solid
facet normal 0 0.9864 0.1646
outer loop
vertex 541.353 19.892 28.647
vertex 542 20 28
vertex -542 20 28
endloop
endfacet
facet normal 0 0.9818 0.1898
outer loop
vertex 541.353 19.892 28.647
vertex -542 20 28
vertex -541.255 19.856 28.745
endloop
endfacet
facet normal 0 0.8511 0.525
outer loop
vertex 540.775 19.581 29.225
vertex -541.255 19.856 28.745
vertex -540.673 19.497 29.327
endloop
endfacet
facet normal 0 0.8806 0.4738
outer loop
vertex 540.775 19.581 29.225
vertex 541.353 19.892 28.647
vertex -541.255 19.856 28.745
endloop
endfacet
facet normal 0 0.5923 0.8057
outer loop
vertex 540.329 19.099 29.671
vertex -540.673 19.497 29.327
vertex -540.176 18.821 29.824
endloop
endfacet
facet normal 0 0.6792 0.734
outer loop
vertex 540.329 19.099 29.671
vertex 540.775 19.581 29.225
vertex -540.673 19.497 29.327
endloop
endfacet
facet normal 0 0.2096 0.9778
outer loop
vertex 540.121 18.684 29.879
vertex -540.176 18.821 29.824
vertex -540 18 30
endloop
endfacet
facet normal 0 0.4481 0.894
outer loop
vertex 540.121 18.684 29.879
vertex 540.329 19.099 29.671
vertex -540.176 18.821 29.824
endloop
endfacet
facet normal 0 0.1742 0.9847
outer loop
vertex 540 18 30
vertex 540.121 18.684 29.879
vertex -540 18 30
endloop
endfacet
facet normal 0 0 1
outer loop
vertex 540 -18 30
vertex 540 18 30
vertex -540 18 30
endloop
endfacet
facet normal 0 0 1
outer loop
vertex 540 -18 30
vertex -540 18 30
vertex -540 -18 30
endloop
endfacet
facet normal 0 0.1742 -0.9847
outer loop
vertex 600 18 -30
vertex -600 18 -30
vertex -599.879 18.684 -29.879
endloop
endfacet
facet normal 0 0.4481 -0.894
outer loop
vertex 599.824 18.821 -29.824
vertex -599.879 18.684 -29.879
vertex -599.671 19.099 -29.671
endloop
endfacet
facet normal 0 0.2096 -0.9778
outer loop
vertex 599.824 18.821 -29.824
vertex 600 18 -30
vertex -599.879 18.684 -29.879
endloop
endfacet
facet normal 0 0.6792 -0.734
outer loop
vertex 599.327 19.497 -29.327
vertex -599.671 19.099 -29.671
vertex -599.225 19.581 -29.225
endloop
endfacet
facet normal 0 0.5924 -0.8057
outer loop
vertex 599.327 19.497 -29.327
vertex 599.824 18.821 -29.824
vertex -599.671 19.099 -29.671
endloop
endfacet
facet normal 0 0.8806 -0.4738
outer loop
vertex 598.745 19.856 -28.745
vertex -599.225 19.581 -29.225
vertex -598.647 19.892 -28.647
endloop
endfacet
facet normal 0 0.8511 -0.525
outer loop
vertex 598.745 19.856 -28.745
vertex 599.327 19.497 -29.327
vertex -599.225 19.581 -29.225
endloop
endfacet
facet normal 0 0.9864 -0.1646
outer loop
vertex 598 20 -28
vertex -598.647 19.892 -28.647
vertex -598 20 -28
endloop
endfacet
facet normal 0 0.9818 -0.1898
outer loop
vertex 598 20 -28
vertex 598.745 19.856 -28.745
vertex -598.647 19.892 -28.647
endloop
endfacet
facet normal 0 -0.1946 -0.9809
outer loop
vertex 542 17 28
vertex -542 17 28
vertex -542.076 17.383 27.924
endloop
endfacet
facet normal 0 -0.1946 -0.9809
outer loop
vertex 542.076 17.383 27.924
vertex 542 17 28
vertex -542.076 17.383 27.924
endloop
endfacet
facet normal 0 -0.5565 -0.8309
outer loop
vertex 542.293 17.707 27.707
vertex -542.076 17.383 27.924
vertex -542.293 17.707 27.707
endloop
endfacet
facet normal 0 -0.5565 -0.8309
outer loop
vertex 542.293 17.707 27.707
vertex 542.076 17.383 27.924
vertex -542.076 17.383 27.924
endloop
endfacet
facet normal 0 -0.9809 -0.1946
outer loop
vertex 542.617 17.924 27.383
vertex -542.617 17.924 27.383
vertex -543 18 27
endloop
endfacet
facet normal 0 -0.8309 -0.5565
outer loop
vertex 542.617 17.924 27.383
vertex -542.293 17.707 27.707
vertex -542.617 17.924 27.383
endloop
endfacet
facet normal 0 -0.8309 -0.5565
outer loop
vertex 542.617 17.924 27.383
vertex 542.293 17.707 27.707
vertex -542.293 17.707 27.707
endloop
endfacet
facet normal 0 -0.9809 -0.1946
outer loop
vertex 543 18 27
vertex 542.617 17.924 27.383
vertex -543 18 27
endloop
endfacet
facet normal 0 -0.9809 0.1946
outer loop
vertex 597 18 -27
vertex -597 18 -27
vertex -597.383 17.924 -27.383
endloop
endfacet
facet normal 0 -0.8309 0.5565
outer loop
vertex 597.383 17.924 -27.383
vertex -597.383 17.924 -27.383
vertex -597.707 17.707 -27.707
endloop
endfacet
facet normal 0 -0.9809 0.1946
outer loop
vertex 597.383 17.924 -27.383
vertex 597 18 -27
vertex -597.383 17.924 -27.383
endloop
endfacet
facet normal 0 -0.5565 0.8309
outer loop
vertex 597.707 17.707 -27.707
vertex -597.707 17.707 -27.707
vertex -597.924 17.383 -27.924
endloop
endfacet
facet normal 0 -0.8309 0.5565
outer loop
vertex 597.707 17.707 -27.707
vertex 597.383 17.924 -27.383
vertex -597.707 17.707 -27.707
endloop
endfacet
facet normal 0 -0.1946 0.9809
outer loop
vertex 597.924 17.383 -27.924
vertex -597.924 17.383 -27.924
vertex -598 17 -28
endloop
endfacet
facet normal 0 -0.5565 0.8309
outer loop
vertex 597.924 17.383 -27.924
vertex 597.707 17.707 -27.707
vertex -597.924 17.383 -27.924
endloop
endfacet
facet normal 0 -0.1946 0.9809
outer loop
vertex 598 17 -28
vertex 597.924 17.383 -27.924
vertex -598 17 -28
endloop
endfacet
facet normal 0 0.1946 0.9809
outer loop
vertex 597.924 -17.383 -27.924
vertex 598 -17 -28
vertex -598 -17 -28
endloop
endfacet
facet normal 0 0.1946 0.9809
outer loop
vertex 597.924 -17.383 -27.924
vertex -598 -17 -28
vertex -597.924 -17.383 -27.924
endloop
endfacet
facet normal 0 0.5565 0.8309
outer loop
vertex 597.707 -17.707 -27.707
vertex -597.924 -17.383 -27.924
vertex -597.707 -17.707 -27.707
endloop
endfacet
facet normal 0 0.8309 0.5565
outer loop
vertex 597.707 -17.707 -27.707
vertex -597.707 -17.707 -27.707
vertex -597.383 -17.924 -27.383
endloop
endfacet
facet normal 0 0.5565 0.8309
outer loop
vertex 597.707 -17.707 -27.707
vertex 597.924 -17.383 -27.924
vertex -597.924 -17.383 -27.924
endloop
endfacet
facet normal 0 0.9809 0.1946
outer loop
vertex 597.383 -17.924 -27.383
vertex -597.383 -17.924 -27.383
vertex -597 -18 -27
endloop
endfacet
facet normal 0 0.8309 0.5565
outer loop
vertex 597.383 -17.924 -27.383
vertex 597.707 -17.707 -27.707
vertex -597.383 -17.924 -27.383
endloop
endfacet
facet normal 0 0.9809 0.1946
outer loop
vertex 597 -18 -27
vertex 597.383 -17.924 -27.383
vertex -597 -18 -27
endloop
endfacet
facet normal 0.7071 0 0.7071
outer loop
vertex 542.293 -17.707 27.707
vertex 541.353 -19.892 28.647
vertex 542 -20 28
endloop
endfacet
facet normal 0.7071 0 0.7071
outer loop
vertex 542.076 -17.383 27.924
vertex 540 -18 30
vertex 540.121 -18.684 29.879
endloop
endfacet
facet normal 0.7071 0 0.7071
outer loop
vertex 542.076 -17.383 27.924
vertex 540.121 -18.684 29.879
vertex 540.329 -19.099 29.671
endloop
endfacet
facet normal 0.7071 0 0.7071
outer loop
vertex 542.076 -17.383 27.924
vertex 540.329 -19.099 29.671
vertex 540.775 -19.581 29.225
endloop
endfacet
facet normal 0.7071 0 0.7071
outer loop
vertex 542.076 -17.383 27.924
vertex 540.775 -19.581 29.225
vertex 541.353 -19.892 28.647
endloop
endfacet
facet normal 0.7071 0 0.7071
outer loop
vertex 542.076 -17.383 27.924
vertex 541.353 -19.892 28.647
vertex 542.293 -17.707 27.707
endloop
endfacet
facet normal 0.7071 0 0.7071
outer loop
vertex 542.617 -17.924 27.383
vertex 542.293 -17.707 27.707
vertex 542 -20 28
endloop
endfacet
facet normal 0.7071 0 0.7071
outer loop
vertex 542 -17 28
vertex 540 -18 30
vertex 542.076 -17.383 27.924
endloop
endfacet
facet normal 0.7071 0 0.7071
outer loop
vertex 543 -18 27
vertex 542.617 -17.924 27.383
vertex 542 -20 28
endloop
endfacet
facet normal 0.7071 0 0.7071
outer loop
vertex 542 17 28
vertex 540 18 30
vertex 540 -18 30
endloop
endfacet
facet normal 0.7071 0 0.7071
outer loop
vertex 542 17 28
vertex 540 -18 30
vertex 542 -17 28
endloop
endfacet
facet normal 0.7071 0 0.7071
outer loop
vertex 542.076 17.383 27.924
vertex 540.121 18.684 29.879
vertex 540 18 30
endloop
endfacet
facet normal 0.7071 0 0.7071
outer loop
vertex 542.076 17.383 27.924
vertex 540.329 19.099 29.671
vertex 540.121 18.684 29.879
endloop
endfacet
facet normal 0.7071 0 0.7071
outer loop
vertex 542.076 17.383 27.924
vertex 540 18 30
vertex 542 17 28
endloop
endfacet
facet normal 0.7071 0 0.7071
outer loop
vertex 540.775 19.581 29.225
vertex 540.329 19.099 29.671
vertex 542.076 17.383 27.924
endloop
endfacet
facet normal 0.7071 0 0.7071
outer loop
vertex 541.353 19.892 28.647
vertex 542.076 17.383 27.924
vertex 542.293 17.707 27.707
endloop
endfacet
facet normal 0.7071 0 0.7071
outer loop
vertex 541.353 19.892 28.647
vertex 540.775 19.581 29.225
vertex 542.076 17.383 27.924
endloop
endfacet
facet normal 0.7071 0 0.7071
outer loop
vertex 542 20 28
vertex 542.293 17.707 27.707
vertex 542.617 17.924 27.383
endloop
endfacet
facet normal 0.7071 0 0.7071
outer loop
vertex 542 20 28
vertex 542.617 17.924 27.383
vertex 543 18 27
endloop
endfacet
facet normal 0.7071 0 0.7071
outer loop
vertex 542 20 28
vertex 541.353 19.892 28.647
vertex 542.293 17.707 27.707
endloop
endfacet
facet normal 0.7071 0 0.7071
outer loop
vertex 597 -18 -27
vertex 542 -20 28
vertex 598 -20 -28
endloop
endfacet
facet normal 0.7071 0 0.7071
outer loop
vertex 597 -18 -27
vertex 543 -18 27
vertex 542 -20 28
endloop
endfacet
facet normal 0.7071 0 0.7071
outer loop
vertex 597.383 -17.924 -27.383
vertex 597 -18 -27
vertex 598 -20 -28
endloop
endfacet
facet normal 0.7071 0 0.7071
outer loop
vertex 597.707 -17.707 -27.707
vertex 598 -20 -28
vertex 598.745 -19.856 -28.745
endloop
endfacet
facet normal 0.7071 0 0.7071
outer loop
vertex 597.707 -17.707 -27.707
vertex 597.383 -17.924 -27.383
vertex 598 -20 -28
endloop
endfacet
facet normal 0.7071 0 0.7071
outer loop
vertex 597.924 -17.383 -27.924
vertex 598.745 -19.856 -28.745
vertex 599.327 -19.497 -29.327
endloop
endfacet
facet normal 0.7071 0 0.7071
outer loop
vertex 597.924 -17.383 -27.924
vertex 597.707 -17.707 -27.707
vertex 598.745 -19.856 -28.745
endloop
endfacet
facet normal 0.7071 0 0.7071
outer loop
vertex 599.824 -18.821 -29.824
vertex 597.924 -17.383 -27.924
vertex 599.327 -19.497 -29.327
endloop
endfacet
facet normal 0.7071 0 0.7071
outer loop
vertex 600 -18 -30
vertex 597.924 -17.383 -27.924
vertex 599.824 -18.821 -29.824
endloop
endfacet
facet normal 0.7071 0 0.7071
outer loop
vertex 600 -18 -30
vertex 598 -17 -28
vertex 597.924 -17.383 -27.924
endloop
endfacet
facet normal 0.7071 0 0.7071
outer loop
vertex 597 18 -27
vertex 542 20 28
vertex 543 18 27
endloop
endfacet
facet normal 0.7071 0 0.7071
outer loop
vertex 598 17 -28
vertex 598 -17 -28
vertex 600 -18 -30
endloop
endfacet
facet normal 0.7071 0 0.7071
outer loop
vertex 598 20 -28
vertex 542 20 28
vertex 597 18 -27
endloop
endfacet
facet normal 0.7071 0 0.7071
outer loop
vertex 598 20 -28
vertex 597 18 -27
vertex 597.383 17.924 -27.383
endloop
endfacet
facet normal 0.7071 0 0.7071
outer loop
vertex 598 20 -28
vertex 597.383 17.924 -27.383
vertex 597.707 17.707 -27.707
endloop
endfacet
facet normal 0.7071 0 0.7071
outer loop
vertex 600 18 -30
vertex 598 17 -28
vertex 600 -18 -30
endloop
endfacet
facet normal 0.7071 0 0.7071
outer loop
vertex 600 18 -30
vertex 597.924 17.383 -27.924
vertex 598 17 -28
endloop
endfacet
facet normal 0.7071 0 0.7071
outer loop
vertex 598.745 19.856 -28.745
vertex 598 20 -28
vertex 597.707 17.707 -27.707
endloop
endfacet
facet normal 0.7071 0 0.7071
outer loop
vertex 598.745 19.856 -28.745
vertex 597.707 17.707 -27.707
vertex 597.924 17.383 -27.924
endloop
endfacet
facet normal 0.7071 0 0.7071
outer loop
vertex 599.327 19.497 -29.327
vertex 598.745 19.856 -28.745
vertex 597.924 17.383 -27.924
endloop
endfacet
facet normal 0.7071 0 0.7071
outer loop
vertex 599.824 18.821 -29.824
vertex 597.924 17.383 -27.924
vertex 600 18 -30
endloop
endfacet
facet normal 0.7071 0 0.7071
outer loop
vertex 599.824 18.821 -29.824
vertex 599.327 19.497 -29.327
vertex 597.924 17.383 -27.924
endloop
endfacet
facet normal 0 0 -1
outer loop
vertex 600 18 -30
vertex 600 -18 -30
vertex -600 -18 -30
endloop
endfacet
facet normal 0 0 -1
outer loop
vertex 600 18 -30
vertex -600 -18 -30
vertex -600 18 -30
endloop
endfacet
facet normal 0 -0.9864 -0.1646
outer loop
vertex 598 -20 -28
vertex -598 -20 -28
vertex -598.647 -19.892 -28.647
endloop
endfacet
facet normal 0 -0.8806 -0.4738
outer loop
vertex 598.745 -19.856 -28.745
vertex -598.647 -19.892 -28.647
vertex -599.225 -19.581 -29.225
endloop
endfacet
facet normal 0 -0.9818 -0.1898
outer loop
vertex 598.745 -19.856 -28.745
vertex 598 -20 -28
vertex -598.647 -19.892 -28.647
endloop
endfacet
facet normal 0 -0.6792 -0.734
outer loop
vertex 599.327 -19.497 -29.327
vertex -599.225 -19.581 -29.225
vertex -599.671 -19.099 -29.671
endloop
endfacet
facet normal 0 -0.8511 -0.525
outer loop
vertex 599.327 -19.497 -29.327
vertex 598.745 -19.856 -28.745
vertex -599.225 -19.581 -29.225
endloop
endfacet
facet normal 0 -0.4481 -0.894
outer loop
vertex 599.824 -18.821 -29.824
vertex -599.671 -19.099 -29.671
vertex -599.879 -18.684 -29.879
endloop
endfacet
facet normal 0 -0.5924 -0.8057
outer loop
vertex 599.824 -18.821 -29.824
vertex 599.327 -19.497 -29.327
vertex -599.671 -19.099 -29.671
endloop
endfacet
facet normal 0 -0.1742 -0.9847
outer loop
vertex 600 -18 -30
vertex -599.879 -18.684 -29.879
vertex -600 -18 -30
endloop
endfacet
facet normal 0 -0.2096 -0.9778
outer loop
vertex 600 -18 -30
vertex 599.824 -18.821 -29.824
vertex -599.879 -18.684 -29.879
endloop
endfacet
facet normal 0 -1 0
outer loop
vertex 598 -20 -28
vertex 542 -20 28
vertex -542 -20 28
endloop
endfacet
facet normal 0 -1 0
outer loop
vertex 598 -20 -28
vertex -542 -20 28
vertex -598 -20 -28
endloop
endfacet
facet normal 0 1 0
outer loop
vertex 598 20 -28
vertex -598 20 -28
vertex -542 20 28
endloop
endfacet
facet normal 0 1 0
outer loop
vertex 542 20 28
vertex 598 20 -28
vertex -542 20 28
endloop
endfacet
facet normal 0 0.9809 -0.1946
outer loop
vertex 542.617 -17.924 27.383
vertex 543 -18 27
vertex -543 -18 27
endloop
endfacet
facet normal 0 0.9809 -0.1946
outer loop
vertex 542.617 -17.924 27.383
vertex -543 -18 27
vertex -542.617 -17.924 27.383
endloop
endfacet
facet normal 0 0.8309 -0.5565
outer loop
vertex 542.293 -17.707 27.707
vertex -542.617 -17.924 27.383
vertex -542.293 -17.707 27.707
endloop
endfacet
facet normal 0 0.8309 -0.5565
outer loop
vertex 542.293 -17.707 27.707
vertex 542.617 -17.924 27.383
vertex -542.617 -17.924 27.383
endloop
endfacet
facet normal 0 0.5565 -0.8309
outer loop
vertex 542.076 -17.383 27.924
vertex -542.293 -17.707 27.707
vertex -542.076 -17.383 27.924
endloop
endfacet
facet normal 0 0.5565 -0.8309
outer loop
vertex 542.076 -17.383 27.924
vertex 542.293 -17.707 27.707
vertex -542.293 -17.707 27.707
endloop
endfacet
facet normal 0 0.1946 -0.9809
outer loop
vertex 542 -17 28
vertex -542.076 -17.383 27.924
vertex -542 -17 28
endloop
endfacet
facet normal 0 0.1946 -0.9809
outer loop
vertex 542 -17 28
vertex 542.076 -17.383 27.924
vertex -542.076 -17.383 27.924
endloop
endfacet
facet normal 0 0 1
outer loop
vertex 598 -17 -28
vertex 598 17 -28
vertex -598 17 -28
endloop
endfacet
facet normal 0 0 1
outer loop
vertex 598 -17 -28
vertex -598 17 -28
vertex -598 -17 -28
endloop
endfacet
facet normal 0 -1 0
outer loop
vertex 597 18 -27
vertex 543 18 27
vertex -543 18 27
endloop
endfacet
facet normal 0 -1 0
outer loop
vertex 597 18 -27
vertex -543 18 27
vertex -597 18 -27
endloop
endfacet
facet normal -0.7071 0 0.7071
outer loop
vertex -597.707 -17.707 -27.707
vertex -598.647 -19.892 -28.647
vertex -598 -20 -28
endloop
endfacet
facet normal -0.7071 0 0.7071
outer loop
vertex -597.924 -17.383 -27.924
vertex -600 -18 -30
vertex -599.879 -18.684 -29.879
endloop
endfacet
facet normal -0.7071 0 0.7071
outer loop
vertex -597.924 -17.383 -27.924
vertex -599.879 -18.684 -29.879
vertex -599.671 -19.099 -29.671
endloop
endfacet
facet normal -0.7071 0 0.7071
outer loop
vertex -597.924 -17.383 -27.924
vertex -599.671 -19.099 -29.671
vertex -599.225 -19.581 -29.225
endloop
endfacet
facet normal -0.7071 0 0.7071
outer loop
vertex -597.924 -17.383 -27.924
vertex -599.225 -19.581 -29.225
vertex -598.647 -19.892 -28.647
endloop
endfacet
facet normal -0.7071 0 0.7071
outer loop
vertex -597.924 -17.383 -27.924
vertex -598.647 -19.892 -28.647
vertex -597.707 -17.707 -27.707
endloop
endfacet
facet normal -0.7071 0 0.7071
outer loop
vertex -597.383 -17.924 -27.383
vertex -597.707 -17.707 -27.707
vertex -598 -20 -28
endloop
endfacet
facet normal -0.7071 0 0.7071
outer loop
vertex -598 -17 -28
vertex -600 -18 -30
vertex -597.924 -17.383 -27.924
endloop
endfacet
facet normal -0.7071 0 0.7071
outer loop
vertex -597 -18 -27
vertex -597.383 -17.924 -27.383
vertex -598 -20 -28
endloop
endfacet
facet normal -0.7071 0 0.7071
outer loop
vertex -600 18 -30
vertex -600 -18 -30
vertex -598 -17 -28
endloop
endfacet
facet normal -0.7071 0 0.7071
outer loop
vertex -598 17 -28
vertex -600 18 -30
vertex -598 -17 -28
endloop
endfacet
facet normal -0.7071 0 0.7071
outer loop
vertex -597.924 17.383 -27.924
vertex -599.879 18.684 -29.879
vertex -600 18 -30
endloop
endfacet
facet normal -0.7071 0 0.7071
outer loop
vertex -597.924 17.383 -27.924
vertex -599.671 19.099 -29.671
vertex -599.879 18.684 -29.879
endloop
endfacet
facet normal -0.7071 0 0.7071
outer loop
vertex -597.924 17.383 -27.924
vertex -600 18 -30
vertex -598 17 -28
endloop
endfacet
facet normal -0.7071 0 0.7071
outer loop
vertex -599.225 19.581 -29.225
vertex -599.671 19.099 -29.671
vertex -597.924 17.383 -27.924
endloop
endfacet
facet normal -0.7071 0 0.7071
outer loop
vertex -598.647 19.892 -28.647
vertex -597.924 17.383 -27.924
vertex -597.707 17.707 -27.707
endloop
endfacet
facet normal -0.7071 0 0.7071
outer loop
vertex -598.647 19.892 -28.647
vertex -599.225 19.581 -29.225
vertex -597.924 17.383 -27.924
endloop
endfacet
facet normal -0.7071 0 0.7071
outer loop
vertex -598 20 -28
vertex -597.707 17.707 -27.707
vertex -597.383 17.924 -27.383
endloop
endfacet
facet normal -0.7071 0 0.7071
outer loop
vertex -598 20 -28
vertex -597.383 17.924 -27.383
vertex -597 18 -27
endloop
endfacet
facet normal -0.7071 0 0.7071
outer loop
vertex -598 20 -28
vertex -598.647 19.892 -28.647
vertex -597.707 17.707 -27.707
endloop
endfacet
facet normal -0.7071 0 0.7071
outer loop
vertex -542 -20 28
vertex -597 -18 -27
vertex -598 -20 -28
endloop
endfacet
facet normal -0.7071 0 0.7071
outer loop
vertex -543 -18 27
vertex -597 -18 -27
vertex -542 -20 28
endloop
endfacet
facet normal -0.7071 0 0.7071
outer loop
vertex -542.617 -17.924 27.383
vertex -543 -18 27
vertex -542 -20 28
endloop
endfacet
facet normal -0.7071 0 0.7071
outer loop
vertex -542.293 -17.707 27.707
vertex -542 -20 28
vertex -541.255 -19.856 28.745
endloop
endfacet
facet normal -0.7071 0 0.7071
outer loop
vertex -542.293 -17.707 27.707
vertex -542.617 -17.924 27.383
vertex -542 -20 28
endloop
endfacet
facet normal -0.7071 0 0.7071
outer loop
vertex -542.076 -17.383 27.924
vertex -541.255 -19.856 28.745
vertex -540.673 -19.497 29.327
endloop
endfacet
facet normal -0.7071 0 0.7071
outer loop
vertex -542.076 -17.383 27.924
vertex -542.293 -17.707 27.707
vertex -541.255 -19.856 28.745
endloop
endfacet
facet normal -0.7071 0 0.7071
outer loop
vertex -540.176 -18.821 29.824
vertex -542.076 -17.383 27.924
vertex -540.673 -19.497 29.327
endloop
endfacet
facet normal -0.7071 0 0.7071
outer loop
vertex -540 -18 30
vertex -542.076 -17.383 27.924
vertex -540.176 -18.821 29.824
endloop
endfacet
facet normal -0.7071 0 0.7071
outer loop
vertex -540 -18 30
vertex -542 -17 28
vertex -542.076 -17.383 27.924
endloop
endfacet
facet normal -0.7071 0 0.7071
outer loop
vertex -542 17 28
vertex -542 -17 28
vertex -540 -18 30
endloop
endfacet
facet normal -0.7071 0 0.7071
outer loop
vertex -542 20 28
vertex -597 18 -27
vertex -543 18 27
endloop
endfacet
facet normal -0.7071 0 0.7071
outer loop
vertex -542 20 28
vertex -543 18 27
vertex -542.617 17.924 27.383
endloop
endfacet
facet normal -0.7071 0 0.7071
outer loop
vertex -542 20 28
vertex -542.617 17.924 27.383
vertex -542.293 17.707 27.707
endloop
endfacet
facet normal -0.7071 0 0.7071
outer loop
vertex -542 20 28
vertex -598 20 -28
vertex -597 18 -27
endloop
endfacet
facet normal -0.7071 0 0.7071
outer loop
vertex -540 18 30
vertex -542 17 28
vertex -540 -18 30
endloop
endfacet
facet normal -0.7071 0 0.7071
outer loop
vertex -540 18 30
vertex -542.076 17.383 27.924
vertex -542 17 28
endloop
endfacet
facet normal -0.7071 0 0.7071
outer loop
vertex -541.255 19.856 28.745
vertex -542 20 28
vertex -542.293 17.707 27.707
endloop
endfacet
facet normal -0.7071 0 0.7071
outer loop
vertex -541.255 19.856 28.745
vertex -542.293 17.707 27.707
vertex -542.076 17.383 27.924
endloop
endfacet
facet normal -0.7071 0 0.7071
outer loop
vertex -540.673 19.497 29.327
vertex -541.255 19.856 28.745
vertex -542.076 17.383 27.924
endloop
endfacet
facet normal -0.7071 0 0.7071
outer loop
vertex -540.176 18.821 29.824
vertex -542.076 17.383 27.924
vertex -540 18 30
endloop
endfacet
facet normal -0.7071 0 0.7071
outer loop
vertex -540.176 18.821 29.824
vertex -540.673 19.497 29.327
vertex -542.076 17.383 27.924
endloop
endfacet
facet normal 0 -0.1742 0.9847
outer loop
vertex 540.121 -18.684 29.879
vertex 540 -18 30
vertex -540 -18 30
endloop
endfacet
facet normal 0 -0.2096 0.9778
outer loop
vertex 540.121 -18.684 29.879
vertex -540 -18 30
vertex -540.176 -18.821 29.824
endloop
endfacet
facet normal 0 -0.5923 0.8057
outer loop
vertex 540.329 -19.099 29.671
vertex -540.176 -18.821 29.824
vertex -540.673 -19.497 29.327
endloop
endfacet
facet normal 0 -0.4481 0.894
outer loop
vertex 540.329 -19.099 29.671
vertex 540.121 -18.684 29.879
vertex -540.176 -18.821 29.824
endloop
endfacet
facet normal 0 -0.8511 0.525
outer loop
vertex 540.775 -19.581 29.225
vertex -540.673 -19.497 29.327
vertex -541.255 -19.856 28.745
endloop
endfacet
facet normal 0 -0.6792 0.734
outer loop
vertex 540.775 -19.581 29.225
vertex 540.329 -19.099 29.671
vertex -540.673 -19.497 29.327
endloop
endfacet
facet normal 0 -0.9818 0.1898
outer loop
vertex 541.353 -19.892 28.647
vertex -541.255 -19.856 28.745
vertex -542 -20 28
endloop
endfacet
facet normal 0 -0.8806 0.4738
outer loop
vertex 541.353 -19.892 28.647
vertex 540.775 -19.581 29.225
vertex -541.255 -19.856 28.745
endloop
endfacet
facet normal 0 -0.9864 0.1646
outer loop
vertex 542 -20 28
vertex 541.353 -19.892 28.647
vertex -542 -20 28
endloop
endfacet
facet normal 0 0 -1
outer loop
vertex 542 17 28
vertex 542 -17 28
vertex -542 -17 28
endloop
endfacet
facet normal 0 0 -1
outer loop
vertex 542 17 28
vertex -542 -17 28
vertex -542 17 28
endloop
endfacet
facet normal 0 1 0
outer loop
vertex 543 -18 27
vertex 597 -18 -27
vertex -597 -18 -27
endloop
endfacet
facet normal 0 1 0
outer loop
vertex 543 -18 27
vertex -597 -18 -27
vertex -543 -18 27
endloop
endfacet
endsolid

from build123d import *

# Parameters (mm, degrees)
F1_DEPTH      = 600
F1_DEPTH_BACK = 600
F3_DEPTH      = 25
F3_DEPTH_BACK = 25


with BuildPart() as f1:
    # F0 (on Right) → F1 (new body, two sides)
    with BuildSketch(Plane.YZ) as f1_sk:
        with BuildLine():
            ThreePointArc((-20, -28), (-19.4142135624, -29.4142135624), (-18, -30))
            Line((-18, -30), (18, -30))
            ThreePointArc((18, -30), (19.4142135624, -29.4142135624), (20, -28))
            Line((20, -28), (20, 28))
            ThreePointArc((20, 28), (19.4142135624, 29.4142135624), (18, 30))
            Line((18, 30), (-18, 30))
            ThreePointArc((-18, 30), (-19.4142135624, 29.4142135624), (-20, 28))
            Line((-20, 28), (-20, -28))
        make_face()
        with BuildLine():
            Line((17, -28), (-17, -28))
            ThreePointArc((-17, -28), (-17.7071067812, -27.7071067812), (-18, -27))
            Line((-18, -27), (-18, 27))
            ThreePointArc((-18, 27), (-17.7071067812, 27.7071067812), (-17, 28))
            Line((-17, 28), (17, 28))
            ThreePointArc((17, 28), (17.7071067812, 27.7071067812), (18, 27))
            Line((18, 27), (18, -27))
            ThreePointArc((18, -27), (17.7071067812, -27.7071067812), (17, -28))
        make_face(mode=Mode.SUBTRACT)
    extrude(amount=F1_DEPTH)
    extrude(f1_sk.sketch, amount=-F1_DEPTH_BACK)

    # F2 (on Front) → F3 (cut, two sides)
    with BuildSketch(Plane.XZ) as f3_sk:
        Polygon((-600, 30), (-600, -30), (-540, 30), align=None)
        Polygon((540, 30), (600, -30), (600, 30), align=None)
    extrude(amount=-F3_DEPTH, mode=Mode.SUBTRACT)
    extrude(f3_sk.sketch, amount=F3_DEPTH_BACK, mode=Mode.SUBTRACT)


solid = f1.part
